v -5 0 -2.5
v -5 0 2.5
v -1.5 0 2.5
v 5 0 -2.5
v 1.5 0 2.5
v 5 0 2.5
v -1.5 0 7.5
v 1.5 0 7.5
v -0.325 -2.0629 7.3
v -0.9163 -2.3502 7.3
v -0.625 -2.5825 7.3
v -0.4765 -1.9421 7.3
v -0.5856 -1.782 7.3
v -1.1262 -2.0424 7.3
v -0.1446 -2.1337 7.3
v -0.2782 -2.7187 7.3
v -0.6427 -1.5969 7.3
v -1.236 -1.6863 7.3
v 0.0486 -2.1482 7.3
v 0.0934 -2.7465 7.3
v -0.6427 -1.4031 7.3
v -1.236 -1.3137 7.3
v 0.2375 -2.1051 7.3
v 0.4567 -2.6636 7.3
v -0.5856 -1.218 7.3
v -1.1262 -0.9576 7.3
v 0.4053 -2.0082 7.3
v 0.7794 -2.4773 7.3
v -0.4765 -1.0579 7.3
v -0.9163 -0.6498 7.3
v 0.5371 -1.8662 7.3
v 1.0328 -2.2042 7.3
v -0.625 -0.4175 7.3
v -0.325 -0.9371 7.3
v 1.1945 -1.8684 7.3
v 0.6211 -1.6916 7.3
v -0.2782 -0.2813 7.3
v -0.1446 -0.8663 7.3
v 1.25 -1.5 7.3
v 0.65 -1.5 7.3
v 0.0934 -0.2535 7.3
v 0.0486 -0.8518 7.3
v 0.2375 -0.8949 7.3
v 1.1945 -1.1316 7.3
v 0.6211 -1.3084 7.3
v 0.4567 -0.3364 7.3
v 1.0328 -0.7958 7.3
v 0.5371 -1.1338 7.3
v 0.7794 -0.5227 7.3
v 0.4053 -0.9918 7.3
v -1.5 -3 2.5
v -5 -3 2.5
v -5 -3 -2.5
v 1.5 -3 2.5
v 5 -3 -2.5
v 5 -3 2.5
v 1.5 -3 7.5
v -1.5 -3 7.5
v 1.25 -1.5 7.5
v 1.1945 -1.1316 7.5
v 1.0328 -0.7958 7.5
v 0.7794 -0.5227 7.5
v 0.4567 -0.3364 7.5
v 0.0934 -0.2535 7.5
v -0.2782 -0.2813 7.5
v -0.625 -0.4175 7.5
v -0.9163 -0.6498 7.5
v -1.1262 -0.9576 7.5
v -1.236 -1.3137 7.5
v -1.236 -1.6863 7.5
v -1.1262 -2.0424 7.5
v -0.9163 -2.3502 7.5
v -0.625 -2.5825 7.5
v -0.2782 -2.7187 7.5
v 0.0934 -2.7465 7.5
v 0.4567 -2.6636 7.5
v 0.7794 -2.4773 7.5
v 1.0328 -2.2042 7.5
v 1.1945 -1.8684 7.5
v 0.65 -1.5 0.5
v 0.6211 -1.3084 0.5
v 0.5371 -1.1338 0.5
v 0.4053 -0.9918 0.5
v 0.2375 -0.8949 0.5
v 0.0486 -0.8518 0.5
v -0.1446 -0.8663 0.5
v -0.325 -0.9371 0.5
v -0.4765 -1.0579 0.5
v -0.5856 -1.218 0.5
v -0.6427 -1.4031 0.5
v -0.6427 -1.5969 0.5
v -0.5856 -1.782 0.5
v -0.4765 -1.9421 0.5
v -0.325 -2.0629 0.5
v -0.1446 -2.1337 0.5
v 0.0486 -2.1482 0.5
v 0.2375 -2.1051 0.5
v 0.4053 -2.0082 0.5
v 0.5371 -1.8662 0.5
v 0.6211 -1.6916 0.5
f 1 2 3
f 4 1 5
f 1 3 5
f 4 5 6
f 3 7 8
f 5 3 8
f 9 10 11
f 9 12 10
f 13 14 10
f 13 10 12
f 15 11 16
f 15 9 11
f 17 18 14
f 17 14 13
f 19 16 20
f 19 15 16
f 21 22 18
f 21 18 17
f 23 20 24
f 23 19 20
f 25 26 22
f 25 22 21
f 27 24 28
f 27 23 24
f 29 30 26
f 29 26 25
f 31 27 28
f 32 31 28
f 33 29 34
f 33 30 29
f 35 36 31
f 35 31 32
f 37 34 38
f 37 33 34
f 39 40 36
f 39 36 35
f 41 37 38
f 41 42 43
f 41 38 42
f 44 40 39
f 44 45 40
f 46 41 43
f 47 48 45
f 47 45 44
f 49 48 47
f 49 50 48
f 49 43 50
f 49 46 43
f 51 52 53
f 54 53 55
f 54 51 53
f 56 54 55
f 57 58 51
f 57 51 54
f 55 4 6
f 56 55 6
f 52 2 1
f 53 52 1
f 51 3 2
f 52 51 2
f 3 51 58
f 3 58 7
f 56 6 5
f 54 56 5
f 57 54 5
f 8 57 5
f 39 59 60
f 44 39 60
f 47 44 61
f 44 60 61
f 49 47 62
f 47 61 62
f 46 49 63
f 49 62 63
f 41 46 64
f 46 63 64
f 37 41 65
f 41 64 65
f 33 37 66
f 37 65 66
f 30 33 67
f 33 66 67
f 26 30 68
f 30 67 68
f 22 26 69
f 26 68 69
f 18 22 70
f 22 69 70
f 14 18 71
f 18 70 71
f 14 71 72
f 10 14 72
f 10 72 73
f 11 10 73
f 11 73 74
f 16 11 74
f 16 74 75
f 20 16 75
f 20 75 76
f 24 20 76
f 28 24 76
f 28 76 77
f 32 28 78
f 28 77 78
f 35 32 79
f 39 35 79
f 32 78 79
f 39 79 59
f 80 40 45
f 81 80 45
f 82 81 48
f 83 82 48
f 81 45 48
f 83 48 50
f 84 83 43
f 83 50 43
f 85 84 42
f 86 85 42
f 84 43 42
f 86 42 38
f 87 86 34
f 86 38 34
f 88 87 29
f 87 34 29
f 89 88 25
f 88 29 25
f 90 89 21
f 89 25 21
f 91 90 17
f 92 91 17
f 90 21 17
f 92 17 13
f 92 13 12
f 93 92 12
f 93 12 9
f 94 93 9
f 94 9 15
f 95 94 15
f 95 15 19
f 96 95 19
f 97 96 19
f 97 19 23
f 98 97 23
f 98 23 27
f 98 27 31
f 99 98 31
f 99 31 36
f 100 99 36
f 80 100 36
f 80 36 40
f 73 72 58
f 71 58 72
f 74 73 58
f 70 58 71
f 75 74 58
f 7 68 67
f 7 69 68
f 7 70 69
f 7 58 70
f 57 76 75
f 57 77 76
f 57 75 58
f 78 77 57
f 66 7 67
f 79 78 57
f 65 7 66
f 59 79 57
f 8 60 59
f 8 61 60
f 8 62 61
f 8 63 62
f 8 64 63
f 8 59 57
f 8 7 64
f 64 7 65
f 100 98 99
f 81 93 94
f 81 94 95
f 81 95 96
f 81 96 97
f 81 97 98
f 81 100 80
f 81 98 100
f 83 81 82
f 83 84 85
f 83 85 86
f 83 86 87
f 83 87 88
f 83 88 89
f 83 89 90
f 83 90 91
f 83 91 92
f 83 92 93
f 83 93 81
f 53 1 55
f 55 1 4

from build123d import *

# Parameters (mm, degrees)
F1_DEPTH = 3
F2_W     = 3
F2_H     = 3
F3_DEPTH = 5
F4_R     = 0.65
F5_DEPTH = 7
F6_R     = 1.25
F7_DEPTH = 0.2


with BuildPart() as f1:
    # F0 (on Front) → F1 (new body)
    with BuildSketch(Plane.XZ):
        Polygon((-5, -2.5), (5, -2.5), (5, 2.5), (1.5, 2.5), (-1.5, 2.5), (-5, 2.5), align=None)
    extrude(amount=F1_DEPTH)

    # F2 (on face) → F3 (join)
    with BuildSketch(Plane.XY.offset(2.5)):
        with Locations((0, -1.5)):
            Rectangle(F2_W, F2_H)
    extrude(amount=F3_DEPTH)

    # F4 (on face) → F5 (cut)
    with BuildSketch(Plane.XY.offset(7.5)):
        with Locations((0, -1.5)):
            Circle(F4_R)
    extrude(amount=-F5_DEPTH, mode=Mode.SUBTRACT)

    # F6 (on face) → F7 (cut)
    with BuildSketch(Plane.XY.offset(7.5)):
        with Locations((0, -1.5)):
            Circle(F6_R)
    extrude(amount=-F7_DEPTH, mode=Mode.SUBTRACT)


solid = f1.part
